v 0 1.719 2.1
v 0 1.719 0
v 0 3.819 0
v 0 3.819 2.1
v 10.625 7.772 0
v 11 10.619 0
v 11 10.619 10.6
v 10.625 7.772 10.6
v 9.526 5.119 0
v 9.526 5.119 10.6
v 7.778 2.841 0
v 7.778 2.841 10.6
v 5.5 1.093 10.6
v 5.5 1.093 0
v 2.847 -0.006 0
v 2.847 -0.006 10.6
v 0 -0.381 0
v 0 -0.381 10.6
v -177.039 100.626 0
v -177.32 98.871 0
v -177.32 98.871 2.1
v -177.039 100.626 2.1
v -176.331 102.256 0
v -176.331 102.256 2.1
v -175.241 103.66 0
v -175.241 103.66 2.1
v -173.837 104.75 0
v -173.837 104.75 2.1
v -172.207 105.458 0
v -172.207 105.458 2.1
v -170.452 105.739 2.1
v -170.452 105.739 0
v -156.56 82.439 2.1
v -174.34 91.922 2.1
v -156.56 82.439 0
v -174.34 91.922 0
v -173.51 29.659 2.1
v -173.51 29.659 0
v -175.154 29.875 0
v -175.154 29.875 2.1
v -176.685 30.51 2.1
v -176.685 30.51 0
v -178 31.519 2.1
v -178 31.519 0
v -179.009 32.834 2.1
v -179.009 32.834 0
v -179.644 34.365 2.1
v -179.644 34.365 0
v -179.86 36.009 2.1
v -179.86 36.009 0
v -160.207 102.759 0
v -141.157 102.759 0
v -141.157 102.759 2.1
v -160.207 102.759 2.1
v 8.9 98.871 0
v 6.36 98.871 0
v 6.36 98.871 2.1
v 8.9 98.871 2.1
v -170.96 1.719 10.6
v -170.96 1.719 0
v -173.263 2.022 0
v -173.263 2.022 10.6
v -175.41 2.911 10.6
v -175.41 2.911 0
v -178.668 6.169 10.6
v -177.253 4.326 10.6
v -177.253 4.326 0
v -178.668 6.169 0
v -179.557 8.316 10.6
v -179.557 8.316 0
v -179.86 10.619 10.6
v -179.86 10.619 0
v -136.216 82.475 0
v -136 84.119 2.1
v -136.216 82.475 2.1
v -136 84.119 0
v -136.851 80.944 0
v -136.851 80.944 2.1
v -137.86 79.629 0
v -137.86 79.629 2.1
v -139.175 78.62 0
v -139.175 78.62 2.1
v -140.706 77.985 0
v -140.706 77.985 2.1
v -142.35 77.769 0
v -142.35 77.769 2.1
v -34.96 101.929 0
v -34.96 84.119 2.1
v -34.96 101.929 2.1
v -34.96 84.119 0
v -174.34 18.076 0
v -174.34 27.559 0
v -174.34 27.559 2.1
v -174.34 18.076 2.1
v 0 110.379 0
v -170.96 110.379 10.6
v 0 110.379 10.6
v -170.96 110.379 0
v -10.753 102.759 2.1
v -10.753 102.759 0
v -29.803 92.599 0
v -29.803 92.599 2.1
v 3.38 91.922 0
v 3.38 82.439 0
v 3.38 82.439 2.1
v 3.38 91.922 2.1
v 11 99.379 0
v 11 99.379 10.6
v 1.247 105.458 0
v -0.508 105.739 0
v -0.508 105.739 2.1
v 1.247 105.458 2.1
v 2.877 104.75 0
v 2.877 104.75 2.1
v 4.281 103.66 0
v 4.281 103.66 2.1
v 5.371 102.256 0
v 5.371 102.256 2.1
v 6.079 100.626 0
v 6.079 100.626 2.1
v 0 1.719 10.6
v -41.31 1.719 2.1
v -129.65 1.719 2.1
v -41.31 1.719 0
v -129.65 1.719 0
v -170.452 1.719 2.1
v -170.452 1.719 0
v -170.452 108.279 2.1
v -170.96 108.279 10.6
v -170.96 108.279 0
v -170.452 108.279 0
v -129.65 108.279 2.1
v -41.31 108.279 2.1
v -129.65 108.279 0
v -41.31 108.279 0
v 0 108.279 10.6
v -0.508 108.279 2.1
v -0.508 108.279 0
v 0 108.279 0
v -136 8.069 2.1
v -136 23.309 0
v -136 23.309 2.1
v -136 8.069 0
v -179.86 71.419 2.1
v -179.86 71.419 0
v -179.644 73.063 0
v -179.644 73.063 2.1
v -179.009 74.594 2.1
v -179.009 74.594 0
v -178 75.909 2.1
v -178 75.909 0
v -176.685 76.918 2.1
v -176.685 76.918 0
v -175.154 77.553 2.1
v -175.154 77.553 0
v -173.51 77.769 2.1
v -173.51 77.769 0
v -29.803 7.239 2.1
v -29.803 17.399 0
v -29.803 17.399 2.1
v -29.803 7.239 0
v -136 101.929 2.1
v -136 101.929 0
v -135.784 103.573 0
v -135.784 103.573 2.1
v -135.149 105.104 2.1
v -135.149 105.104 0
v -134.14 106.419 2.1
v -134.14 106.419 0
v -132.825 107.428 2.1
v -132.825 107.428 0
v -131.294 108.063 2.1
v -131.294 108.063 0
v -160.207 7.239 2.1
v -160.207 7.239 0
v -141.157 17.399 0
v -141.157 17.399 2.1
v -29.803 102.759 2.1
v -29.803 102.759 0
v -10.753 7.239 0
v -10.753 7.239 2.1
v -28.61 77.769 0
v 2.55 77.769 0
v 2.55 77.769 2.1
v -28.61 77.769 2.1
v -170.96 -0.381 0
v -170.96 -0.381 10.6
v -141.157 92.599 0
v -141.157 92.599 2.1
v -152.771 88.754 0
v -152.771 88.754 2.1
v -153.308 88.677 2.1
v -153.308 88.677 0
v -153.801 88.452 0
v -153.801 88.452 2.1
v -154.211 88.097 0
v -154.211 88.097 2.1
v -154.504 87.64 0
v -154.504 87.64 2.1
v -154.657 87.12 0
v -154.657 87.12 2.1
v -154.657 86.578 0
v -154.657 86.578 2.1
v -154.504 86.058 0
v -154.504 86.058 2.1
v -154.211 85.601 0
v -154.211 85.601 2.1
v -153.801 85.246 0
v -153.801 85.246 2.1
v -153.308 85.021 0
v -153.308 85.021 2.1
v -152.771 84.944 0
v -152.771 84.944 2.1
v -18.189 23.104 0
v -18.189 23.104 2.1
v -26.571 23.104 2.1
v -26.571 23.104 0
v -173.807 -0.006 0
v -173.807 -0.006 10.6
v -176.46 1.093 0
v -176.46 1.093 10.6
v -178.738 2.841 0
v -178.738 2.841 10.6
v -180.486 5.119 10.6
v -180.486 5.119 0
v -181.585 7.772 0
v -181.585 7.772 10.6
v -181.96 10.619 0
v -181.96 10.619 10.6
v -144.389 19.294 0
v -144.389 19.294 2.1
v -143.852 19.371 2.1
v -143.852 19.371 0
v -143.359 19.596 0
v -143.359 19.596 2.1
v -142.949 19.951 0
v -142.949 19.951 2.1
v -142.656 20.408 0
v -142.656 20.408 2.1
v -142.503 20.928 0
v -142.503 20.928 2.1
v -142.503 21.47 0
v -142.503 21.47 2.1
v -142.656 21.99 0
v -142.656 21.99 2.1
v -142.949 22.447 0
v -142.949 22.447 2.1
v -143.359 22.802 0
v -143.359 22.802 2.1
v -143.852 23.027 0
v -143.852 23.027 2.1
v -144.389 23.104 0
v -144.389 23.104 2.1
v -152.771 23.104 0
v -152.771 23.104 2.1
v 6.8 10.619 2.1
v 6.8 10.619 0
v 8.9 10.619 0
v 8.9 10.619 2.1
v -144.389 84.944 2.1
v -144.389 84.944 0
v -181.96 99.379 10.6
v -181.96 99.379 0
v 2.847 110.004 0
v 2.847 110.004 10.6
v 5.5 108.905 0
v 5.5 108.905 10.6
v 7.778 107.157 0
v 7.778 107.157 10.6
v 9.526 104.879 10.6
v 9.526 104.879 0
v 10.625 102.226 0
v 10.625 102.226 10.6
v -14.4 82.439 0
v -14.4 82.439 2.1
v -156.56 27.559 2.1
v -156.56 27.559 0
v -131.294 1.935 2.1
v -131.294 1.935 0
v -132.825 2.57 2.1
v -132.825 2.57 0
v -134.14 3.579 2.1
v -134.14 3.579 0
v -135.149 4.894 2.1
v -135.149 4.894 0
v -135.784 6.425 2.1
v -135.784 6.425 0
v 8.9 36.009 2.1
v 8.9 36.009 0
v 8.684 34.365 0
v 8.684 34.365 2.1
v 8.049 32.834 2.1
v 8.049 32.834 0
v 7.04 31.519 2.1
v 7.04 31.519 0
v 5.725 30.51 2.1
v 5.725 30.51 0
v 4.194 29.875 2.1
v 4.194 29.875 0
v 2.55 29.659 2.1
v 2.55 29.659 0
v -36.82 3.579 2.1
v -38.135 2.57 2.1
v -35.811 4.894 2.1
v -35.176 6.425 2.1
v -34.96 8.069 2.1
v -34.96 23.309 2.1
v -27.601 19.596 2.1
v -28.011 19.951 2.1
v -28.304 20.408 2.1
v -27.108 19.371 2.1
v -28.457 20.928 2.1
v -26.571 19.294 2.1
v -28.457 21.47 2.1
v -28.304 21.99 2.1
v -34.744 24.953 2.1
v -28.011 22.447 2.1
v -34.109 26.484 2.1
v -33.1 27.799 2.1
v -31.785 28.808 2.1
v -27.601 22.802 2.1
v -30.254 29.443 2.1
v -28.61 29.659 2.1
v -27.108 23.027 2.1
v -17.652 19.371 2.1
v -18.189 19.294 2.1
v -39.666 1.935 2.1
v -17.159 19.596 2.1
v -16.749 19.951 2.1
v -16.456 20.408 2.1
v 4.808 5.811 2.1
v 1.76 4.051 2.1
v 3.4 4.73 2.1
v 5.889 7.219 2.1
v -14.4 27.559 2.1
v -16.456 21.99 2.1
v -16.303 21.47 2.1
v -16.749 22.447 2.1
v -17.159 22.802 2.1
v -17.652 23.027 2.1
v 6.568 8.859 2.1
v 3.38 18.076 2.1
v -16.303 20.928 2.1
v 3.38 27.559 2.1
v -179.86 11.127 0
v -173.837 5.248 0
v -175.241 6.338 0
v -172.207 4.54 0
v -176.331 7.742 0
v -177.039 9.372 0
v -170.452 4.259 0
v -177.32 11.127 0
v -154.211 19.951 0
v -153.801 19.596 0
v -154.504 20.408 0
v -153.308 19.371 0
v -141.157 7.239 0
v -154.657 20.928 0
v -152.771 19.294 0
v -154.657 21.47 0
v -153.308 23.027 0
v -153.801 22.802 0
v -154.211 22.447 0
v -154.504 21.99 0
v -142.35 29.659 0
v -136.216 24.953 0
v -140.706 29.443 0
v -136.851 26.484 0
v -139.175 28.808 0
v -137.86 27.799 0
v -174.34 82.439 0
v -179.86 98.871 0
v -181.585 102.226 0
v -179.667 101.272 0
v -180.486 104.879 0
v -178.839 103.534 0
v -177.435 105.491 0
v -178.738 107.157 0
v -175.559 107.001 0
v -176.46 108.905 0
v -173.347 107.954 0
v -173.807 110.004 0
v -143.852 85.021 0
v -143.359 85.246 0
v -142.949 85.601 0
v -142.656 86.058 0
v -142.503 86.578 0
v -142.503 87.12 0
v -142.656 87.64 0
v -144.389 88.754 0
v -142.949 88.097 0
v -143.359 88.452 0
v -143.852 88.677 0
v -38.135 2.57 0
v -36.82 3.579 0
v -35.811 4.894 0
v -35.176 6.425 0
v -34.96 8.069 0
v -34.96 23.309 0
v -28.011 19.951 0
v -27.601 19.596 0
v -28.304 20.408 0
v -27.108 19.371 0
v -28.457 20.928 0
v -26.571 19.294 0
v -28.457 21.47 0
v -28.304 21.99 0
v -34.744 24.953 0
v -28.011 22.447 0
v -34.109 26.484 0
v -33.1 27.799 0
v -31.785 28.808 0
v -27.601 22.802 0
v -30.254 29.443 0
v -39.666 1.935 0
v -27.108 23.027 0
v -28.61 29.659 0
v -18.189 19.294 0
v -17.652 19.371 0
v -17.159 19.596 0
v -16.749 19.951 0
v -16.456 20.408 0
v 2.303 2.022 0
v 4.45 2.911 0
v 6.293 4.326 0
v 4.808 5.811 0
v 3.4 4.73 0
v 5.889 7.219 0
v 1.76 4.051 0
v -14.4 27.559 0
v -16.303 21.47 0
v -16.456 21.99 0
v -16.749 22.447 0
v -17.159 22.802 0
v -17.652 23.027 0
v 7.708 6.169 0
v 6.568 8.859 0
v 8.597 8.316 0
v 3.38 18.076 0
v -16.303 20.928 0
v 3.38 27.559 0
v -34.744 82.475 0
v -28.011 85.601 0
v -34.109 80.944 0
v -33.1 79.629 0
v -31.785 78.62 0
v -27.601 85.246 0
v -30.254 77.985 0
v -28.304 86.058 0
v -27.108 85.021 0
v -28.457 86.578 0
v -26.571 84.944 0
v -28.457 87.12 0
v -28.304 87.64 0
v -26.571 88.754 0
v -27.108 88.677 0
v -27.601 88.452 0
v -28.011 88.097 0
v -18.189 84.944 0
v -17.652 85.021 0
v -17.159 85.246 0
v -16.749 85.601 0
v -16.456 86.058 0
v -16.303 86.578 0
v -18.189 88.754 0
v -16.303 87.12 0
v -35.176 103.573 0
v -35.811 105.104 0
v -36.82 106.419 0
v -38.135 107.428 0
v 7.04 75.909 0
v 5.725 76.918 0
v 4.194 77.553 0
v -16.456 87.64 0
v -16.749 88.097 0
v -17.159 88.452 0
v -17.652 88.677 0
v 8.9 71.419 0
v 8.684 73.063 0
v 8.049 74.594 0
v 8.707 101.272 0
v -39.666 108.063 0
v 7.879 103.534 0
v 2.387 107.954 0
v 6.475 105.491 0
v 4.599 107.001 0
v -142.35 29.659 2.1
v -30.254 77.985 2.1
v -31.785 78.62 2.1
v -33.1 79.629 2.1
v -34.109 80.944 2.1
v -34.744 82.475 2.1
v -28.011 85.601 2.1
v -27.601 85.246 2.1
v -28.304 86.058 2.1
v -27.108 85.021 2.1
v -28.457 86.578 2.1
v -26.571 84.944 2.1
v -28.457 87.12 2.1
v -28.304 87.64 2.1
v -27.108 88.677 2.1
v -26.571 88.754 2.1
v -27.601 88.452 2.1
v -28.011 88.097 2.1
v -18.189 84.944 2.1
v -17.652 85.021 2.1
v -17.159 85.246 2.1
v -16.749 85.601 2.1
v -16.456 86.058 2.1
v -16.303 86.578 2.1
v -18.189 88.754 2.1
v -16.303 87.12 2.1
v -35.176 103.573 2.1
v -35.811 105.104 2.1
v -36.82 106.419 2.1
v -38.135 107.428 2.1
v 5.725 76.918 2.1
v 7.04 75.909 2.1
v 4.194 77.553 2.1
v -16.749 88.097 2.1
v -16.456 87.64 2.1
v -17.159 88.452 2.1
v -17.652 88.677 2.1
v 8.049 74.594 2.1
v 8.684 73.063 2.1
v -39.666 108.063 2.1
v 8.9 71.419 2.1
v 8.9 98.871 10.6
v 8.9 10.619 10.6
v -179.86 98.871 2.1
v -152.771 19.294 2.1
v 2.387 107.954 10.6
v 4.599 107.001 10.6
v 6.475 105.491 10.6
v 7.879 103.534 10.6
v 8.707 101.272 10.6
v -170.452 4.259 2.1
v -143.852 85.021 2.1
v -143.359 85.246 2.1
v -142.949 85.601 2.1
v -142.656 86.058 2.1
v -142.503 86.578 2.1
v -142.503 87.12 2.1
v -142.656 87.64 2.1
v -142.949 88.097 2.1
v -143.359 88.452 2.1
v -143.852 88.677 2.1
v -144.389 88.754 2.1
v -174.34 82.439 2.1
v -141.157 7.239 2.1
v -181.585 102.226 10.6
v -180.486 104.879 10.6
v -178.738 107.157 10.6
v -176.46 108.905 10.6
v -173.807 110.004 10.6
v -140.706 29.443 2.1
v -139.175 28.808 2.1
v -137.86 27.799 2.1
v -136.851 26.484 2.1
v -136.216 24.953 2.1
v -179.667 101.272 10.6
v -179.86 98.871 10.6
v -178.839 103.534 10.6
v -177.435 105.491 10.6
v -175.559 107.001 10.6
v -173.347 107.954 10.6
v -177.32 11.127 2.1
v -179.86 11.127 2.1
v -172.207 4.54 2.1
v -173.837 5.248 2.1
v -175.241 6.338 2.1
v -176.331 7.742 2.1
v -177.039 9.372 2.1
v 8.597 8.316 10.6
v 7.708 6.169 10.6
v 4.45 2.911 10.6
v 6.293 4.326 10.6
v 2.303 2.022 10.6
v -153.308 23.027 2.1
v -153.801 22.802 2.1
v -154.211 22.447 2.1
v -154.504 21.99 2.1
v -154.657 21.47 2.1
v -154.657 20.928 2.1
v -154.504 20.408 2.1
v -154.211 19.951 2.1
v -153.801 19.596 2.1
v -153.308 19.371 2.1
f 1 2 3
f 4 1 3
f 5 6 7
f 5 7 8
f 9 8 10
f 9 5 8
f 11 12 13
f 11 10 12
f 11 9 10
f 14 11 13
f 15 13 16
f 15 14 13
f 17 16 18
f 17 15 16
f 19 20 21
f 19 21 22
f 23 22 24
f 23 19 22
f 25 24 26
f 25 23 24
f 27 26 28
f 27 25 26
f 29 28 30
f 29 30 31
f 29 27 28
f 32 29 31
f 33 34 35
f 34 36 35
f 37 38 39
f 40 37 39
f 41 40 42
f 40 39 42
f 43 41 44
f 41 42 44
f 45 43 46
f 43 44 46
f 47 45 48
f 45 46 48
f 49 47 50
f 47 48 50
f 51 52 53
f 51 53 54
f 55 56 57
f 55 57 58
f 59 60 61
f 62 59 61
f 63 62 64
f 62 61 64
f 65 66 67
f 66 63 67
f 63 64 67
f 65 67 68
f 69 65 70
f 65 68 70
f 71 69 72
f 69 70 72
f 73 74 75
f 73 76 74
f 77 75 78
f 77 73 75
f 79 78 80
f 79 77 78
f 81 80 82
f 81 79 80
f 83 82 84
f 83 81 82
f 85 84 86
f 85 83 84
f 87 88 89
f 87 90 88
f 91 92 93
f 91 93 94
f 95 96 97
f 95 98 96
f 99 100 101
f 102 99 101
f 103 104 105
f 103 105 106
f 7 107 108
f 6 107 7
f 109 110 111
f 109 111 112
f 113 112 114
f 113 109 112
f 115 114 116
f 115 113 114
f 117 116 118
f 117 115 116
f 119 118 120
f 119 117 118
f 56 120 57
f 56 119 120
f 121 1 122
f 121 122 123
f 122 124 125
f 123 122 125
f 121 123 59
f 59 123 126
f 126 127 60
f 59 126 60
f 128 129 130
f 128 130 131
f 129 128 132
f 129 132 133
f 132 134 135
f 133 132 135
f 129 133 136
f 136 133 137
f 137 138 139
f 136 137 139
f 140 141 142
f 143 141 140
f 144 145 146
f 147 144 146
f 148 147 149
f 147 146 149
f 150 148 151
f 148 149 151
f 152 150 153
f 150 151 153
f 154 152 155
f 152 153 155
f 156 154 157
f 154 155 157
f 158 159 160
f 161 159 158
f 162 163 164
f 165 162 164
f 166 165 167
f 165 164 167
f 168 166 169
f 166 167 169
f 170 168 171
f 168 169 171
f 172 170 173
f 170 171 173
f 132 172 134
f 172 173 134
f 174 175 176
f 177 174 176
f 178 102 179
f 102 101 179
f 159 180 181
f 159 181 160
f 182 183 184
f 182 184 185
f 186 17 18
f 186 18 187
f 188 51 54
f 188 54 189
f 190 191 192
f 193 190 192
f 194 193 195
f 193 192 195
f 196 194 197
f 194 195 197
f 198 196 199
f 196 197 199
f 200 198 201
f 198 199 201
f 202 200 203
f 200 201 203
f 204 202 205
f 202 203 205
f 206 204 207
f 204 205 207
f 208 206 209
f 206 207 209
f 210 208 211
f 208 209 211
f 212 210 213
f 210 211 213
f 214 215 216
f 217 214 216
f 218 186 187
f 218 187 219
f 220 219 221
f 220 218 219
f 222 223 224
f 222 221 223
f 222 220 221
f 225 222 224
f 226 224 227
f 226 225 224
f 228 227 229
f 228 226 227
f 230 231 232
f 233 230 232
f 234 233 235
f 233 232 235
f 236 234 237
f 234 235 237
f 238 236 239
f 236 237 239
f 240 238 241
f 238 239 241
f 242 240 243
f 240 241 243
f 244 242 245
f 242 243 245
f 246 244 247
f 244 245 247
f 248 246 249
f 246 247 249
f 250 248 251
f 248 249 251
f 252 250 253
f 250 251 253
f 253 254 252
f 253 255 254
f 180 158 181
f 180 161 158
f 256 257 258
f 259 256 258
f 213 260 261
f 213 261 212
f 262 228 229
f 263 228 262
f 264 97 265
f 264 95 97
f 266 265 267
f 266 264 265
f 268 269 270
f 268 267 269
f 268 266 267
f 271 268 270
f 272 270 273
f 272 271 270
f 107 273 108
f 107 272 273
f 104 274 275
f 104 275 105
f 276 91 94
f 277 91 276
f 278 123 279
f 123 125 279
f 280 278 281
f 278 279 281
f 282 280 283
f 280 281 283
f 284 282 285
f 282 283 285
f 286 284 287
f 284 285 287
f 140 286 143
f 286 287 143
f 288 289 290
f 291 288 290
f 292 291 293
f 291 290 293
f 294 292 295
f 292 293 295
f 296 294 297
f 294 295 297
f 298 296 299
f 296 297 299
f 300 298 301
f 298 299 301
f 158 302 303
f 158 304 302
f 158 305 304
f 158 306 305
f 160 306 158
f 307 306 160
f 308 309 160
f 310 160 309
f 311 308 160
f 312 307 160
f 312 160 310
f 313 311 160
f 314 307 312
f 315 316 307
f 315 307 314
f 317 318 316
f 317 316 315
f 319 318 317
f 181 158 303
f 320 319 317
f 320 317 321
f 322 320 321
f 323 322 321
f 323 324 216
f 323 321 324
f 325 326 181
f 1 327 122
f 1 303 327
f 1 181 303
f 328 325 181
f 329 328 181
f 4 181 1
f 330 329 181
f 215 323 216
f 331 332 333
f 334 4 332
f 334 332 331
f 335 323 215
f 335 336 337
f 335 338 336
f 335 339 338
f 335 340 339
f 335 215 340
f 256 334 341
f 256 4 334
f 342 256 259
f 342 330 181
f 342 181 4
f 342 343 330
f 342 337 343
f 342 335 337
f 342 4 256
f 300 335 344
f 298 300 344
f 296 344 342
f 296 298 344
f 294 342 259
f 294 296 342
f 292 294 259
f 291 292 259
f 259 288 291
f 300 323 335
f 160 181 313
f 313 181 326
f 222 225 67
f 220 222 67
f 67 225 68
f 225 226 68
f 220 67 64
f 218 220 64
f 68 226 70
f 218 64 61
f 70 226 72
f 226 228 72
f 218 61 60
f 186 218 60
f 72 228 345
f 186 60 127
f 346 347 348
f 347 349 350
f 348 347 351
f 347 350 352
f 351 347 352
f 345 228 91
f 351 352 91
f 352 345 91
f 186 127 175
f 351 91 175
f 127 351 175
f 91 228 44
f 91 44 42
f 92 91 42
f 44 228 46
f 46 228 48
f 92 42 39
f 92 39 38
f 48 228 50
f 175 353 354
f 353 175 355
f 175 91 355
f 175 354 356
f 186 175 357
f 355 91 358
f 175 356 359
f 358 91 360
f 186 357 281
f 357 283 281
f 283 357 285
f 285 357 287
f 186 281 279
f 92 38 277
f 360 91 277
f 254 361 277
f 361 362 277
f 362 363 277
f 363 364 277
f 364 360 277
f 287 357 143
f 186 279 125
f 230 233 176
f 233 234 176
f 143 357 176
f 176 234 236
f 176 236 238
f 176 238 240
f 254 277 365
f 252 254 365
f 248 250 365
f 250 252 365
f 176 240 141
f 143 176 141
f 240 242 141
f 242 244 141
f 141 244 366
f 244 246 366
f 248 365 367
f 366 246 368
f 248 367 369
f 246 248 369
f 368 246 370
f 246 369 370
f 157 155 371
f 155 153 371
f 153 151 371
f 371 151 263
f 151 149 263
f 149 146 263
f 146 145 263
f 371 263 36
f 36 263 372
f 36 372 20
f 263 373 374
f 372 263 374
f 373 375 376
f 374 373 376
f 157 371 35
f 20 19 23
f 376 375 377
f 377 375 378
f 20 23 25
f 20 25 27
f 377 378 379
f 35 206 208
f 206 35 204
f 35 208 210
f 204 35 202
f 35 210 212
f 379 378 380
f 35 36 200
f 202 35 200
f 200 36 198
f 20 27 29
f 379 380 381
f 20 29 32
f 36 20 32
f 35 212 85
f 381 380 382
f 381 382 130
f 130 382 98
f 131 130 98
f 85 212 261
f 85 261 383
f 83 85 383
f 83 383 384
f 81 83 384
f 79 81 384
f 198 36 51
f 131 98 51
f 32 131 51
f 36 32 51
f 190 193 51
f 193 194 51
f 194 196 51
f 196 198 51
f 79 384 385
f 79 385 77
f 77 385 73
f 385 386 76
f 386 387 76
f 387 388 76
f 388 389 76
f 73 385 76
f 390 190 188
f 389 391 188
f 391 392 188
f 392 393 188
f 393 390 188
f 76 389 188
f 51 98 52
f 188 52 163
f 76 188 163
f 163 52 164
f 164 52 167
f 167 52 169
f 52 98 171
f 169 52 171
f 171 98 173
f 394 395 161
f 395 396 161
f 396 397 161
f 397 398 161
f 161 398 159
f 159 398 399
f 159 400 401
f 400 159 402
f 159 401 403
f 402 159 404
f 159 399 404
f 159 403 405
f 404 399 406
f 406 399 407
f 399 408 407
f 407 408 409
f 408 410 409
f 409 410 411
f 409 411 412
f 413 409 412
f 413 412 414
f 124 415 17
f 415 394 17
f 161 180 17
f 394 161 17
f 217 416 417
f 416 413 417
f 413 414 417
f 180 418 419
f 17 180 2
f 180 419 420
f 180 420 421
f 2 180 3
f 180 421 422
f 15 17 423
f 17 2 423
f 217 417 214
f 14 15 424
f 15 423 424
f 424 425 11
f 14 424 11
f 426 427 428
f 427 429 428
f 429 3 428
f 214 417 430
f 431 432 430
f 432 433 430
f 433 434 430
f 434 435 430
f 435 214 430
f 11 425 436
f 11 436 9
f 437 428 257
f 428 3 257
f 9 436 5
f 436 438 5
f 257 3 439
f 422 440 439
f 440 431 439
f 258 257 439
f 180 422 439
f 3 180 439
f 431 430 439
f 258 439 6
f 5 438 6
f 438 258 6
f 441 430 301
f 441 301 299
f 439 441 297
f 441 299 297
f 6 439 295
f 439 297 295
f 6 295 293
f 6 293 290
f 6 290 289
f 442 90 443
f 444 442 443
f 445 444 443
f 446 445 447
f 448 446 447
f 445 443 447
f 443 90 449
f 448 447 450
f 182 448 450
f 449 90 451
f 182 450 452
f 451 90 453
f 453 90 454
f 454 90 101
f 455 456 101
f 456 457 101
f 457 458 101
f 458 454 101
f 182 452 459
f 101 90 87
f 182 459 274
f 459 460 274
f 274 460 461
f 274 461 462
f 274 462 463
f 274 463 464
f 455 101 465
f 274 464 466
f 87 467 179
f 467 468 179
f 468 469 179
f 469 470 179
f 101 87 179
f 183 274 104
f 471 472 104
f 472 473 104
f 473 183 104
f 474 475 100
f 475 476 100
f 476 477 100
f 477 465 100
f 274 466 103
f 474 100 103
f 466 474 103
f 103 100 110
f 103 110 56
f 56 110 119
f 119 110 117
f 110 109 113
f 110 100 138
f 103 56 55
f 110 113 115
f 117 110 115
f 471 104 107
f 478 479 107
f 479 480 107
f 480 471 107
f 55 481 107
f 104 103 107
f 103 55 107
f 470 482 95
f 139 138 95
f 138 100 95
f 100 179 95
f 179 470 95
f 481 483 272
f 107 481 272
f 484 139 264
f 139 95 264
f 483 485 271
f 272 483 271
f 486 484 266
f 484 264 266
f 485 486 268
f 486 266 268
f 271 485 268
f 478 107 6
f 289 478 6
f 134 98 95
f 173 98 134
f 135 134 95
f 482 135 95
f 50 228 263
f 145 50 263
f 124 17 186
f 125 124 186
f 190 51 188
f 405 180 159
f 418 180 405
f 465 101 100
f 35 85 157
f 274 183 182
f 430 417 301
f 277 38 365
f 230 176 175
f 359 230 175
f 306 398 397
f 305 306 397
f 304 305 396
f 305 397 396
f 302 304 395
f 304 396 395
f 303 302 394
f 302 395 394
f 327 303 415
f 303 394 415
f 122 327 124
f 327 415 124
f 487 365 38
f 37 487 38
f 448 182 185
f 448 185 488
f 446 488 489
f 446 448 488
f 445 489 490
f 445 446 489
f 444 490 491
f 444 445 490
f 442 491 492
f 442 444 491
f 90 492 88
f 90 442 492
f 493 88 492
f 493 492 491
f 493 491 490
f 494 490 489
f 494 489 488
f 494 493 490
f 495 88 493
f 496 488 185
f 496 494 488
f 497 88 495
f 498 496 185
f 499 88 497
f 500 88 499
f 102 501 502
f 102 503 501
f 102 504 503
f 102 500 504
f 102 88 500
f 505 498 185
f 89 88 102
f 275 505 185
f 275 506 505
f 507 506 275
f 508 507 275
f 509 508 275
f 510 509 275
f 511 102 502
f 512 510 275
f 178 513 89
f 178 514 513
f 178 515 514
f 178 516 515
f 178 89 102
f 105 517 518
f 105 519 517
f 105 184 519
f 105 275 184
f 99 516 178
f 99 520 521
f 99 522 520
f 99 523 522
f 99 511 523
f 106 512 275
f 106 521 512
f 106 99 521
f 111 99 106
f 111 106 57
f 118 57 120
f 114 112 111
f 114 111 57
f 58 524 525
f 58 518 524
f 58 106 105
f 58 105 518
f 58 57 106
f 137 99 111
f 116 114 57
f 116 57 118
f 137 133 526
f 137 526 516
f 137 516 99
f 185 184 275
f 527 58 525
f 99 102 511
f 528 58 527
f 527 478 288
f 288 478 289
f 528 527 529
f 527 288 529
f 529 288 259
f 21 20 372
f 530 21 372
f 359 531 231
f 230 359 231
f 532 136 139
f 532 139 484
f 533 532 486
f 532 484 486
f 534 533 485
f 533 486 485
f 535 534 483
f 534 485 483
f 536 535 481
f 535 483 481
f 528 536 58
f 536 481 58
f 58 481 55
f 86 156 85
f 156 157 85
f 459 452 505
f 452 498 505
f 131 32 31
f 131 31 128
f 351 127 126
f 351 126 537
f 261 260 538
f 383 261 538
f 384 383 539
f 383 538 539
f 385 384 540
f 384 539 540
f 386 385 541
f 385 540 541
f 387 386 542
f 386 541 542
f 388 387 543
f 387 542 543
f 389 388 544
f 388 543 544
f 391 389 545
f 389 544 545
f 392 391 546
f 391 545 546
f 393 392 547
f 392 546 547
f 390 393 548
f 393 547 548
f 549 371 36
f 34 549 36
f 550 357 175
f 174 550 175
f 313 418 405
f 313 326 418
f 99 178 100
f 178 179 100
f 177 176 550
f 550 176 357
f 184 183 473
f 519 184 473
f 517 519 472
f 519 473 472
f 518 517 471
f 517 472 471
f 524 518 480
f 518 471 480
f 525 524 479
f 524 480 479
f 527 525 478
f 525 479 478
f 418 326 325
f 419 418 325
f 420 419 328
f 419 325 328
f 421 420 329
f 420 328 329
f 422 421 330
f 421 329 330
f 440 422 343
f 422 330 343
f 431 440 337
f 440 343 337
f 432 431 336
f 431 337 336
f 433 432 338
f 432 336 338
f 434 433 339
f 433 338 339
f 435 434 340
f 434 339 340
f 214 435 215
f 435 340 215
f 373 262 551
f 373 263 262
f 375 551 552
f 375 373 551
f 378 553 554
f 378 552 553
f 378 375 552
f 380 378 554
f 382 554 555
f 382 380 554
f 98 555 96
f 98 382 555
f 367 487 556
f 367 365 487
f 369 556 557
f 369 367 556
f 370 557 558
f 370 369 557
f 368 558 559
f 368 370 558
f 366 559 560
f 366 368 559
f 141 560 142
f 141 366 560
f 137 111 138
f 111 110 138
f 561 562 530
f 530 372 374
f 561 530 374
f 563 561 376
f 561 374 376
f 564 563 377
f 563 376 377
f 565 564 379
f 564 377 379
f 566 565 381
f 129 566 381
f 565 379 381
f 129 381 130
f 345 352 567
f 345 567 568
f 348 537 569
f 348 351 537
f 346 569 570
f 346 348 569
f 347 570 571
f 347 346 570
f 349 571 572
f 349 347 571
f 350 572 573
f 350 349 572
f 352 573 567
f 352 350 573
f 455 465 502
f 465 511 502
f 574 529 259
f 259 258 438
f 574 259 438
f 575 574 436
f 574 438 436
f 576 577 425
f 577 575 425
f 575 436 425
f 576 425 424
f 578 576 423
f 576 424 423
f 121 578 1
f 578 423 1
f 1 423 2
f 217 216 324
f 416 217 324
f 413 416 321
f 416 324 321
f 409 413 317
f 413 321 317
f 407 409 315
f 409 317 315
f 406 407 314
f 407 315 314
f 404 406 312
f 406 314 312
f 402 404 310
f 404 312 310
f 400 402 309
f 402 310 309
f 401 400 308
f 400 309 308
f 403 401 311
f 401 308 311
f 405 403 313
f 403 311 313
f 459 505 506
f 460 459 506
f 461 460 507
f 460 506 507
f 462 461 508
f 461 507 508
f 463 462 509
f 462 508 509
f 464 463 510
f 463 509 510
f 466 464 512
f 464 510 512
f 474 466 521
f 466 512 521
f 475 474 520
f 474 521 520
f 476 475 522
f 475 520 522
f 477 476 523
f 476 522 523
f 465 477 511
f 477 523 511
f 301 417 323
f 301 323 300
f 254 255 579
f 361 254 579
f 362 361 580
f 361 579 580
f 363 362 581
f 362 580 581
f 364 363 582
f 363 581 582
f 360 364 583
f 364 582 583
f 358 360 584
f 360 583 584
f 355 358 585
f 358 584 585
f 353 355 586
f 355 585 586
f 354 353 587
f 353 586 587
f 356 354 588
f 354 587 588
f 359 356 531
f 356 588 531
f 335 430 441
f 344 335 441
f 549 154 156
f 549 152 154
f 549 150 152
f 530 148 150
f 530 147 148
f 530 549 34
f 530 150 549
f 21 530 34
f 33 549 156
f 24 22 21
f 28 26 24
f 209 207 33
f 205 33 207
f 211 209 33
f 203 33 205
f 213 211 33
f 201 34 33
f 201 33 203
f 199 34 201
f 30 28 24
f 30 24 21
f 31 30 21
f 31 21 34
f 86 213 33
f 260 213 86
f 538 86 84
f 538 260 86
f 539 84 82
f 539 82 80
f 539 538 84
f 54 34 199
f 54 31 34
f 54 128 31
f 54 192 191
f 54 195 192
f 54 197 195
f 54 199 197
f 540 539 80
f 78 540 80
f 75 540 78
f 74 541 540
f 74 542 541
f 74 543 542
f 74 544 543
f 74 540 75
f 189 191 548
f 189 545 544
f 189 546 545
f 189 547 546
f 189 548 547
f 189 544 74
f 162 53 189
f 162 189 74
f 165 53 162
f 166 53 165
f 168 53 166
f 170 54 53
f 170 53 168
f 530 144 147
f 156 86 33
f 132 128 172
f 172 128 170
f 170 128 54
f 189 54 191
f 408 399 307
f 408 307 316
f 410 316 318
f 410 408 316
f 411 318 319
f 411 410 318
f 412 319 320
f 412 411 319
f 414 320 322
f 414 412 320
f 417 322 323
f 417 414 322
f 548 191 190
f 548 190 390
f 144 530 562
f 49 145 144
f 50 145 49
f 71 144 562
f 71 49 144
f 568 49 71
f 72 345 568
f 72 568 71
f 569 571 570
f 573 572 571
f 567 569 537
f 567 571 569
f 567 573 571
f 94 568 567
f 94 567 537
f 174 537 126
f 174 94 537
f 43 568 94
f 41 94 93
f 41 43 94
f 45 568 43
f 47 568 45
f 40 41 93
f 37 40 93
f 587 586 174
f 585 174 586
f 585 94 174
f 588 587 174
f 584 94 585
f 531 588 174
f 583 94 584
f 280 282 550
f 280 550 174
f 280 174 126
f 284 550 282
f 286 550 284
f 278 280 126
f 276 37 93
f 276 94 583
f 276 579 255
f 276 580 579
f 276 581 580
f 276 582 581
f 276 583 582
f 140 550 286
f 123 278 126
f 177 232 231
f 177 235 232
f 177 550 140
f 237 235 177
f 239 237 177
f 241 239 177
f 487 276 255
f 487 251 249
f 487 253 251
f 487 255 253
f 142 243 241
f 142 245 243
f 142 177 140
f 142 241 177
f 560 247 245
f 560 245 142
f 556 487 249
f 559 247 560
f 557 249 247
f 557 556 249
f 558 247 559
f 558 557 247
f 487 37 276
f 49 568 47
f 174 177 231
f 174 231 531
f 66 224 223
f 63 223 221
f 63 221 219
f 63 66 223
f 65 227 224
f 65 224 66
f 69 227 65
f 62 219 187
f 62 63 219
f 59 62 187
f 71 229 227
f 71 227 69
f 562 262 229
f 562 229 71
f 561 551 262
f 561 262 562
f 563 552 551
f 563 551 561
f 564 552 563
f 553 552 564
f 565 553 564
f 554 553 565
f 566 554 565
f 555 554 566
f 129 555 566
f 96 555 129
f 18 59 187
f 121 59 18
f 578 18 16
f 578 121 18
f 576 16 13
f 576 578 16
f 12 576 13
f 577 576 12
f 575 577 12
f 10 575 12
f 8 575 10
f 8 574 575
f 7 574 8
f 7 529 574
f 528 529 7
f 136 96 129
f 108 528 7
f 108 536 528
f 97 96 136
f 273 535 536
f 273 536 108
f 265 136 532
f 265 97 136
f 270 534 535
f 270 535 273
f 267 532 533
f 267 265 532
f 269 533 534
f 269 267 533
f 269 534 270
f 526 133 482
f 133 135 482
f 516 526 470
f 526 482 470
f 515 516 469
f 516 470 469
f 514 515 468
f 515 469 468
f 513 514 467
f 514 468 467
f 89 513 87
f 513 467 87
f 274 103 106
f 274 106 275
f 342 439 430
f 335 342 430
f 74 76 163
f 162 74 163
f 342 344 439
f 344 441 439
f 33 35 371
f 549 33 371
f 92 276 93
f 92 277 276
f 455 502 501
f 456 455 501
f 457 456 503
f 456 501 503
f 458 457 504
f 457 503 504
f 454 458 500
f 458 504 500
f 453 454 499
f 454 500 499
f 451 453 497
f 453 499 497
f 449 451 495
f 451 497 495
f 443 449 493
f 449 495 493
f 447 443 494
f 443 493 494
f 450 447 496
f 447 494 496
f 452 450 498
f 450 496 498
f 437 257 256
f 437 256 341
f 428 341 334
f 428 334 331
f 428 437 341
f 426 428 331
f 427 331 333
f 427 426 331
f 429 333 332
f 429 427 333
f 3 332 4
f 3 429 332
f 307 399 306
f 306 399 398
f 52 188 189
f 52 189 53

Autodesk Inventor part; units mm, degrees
ref_plane "YZ Plane" through (0, 0, 0) normal (1, 0, 0) x (0, 1, 0)
ref_plane "XZ Plane" through (0, 0, 0) normal (0, 1, 0) x (-1, 0, 0)
ref_plane "XY Plane" through (0, 0, 0) normal (0, 0, 1) x (1, 0, 0)
sketch "Sketch1" plane through (0, 0, 0) normal (0, 0, 1) x (1, 0, 0)
  arc A0 (0, -0.381) -> (11, 10.619) centre (0, 10.619) ccw projected
  line L0 (11, 99.379) -> (11, 10.619) projected
  line L1 (0, -0.381) -> (-170.96, -0.381) projected
  arc A1 (11, 99.379) -> (0, 110.379) centre (0, 99.379) ccw projected
  line L2 (-170.96, 110.379) -> (0, 110.379) projected
  arc A2 (-170.96, 110.379) -> (-181.96, 99.379) centre (-170.96, 99.379) ccw projected
  line L3 (-181.96, 10.619) -> (-181.96, 99.379) projected
  arc A3 (-181.96, 10.619) -> (-170.96, -0.381) centre (-170.96, 10.619) ccw projected
  circle A4 centre (-22.38, 21.199) radius 1.5 projected
  circle A5 centre (-148.58, 21.199) radius 1.5 projected
  circle A6 centre (-148.58, 86.849) radius 1.5 projected
  circle A7 centre (-22.38, 86.849) radius 1.5 projected
  circle A8 centre (-22.38, 21.199) radius 1.905
  circle A9 centre (-22.38, 86.849) radius 1.905
  line L4 (-41.31, 1.719) -> (-129.65, 1.719)
  line L5 (-129.65, 108.279) -> (-41.31, 108.279)
  line L6 (8.9, 71.419) -> (8.9, 36.009)
  line L7 (-34.96, 23.309) -> (-34.96, 8.069)
  line L8 (-28.61, 29.659) -> (2.55, 29.659)
  arc A10 (-28.61, 29.659) -> (-34.96, 23.309) centre (-28.61, 23.309) ccw
  line L9 (2.55, 77.769) -> (-28.61, 77.769)
  line L10 (-34.96, 84.119) -> (-34.96, 101.929)
  arc A11 (-34.96, 84.119) -> (-28.61, 77.769) centre (-28.61, 84.119) ccw
  arc A12 (2.55, 29.659) -> (8.9, 36.009) centre (2.55, 36.009) ccw
  arc A13 (-41.31, 1.719) -> (-34.96, 8.069) centre (-41.31, 8.069) ccw
  arc A14 (-34.96, 101.929) -> (-41.31, 108.279) centre (-41.31, 101.929) ccw
  arc A15 (8.9, 71.419) -> (2.55, 77.769) centre (2.55, 71.419) ccw
  line L11 (-29.88, 25.199) -> (-29.88, 17.199) projected
  line L12 (-14.88, 25.199) -> (-29.88, 25.199) projected
  line L13 (-29.88, 82.849) -> (-14.88, 82.849) projected
  line L14 (-29.88, 90.849) -> (-29.88, 82.849) projected
  circle A16 centre (-148.58, 21.199) radius 1.905
  circle A17 centre (-148.58, 86.849) radius 1.905
  line L15 (-179.86, 71.419) -> (-179.86, 36.009)
  line L16 (-136, 23.309) -> (-136, 8.069)
  line L17 (-142.35, 29.659) -> (-173.51, 29.659)
  arc A18 (-136, 23.309) -> (-142.35, 29.659) centre (-142.35, 23.309) ccw
  line L18 (-173.51, 77.769) -> (-142.35, 77.769)
  line L19 (-136, 84.119) -> (-136, 101.929)
  arc A19 (-142.35, 77.769) -> (-136, 84.119) centre (-142.35, 84.119) ccw
  arc A20 (-179.86, 36.009) -> (-173.51, 29.659) centre (-173.51, 36.009) ccw
  arc A21 (-136, 8.069) -> (-129.65, 1.719) centre (-129.65, 8.069) ccw
  arc A22 (-129.65, 108.279) -> (-136, 101.929) centre (-129.65, 101.929) ccw
  arc A23 (-173.51, 77.769) -> (-179.86, 71.419) centre (-173.51, 71.419) ccw
  point P0 (0, 0)
  point P1 (-34.96, 1.719)
  point P2 (8.9, 29.659)
  point P3 (8.9, 77.769)
  point P4 (-34.96, 77.769)
  point P5 (-34.96, 108.279)
  dimension "d1" = 23.53
  dimension "d2" = 3.81
  dimension "d5" = 3.81
  dimension "d16" = 27.94
  dimension "d18" = 6.35
  dimension "d21" = 6.35
  dimension "d22" = 6.35
  dimension "d23" = 2.1
  dimension "d24" = 2.1
  dimension "d25" = 2.1
  dimension "d33" = 5.08
  dimension "d34" = 5.08
  dimension "d35" = 5.08
  dimension "d36" = 6.35
  dimension "d37" = 6.35
extrude "Extrusion3" add sketch "Sketch1" along normal blind 2.1 contours L1 A3 L3 A2 L2 A1 L0 A0
sketch "Sketch4" plane through (0, 0, 2.1) normal (0, 0, 1) x (1, 0, 0)
  arc A0 (-28.61, 29.659) -> (-34.96, 23.309) centre (-28.61, 23.309) ccw projected
  line L0 (-34.96, 23.309) -> (-34.96, 8.069) projected
  arc A1 (-41.31, 1.719) -> (-34.96, 8.069) centre (-41.31, 8.069) ccw projected
  line L1 (-41.31, 1.719) -> (-129.65, 1.719) projected
  arc A2 (-136, 8.069) -> (-129.65, 1.719) centre (-129.65, 8.069) ccw projected
  line L2 (-136, 8.069) -> (-136, 23.309) projected
  arc A3 (-136, 23.309) -> (-142.35, 29.659) centre (-142.35, 23.309) ccw projected
  line L3 (-142.35, 29.659) -> (-173.51, 29.659) projected
  arc A4 (-179.86, 36.009) -> (-173.51, 29.659) centre (-173.51, 36.009) ccw projected
  line L4 (-179.86, 36.009) -> (-179.86, 71.419) projected
  arc A5 (-173.51, 77.769) -> (-179.86, 71.419) centre (-173.51, 71.419) ccw projected
  line L5 (-173.51, 77.769) -> (-142.35, 77.769) projected
  arc A6 (-142.35, 77.769) -> (-136, 84.119) centre (-142.35, 84.119) ccw projected
  line L6 (-136, 84.119) -> (-136, 101.929) projected
  arc A7 (-129.65, 108.279) -> (-136, 101.929) centre (-129.65, 101.929) ccw projected
  line L7 (-129.65, 108.279) -> (-41.31, 108.279) projected
  arc A8 (-34.96, 101.929) -> (-41.31, 108.279) centre (-41.31, 101.929) ccw projected
  line L8 (-34.96, 101.929) -> (-34.96, 84.119) projected
  arc A9 (-34.96, 84.119) -> (-28.61, 77.769) centre (-28.61, 84.119) ccw projected
  line L9 (-28.61, 77.769) -> (2.55, 77.769) projected
  arc A10 (8.9, 71.419) -> (2.55, 77.769) centre (2.55, 71.419) ccw projected
  line L10 (8.9, 71.419) -> (8.9, 36.009) projected
  arc A11 (2.55, 29.659) -> (8.9, 36.009) centre (2.55, 36.009) ccw projected
  line L11 (2.55, 29.659) -> (-28.61, 29.659) projected
  circle A12 centre (-148.58, 86.849) radius 1.905 projected
  circle A13 centre (-148.58, 21.199) radius 1.905 projected
  circle A14 centre (-22.38, 86.849) radius 1.905 projected
  circle A15 centre (-22.38, 21.199) radius 1.905 projected
  arc A16 (0, -0.381) -> (11, 10.619) centre (0, 10.619) ccw projected
  line L12 (11, 10.619) -> (11, 99.379) projected
  arc A17 (11, 99.379) -> (0, 110.379) centre (0, 99.379) ccw projected
  line L13 (0, 110.379) -> (-170.96, 110.379) projected
  arc A18 (-170.96, 110.379) -> (-181.96, 99.379) centre (-170.96, 99.379) ccw projected
  line L14 (-181.96, 99.379) -> (-181.96, 10.619) projected
  arc A19 (-181.96, 10.619) -> (-170.96, -0.381) centre (-170.96, 10.619) ccw projected
  line L15 (-170.96, -0.381) -> (0, -0.381) projected
  arc A20 (0, 1.719) -> (8.9, 10.619) centre (0, 10.619) ccw
  line L16 (8.9, 10.619) -> (8.9, 99.379)
  arc A21 (8.9, 99.379) -> (0, 108.279) centre (0, 99.379) ccw
  line L17 (0, 108.279) -> (-170.96, 108.279)
  arc A22 (-170.96, 108.279) -> (-179.86, 99.379) centre (-170.96, 99.379) ccw
  line L18 (-179.86, 99.379) -> (-179.86, 10.619)
  arc A23 (-179.86, 10.619) -> (-170.96, 1.719) centre (-170.96, 10.619) ccw
  line L19 (-170.96, 1.719) -> (0, 1.719)
  point P0 (0, 0)
  dimension "d40" = 2.1
extrude "Extrusion4" add sketch "Sketch4" along normal blind 8.5 contours L15 A19 L14 A18 L13 A17 L12 A16
ref_plane "Work Plane1" through (-85.48, 10.619, 10.6) normal (-1, 0, 0) x (0, 0, 1)
ref_plane "Work Plane2" through (-170.96, 54.999, 10.6) normal (0, -1, 0) x (1, 0, 0)
sketch "Sketch9" plane through (0, 0, 0) normal (0, 0, -1) x (-1, 0, 0)
  arc A0 (-8.9, 10.619) -> (0, 1.719) centre (0, 10.619) ccw projected
  arc A1 (-6.8, 10.619) -> (0, 3.819) centre (0, 10.619) ccw projected
  line L0 (0, 1.719) -> (0, 3.819) projected
  line L1 (-6.8, 10.619) -> (-8.9, 10.619) projected
  arc A2 (170.96, 1.719) -> (179.86, 10.619) centre (170.96, 10.619) ccw projected
  arc A3 (170.96, 3.819) -> (177.76, 10.619) centre (170.96, 10.619) ccw projected
  line L2 (170.96, 3.819) -> (170.96, 1.719) projected
  line L3 (179.86, 10.619) -> (177.76, 10.619) projected
  arc A4 (179.86, 99.379) -> (170.96, 108.279) centre (170.96, 99.379) ccw projected
  arc A5 (177.76, 99.379) -> (170.96, 106.179) centre (170.96, 99.379) ccw projected
  line L4 (177.76, 99.379) -> (179.86, 99.379) projected
  line L5 (170.96, 108.279) -> (170.96, 106.179) projected
  arc A6 (0, 106.179) -> (-6.8, 99.379) centre (0, 99.379) ccw projected
  arc A7 (0, 108.279) -> (-8.9, 99.379) centre (0, 99.379) ccw projected
  line L6 (-8.9, 99.379) -> (-6.8, 99.379) projected
  line L7 (0, 106.179) -> (0, 108.279) projected
  line L8 (170.96, 1.719) -> (0, 1.719) projected
  line L9 (0.508, 1.719) -> (0, 1.719)
  line L10 (-6.36, 11.127) -> (-8.9, 11.127)
  line L11 (-8.9, 11.127) -> (-8.9, 10.619)
  line L12 (0.508, 1.719) -> (0.508, 4.259)
  arc A8 (-6.36, 11.127) -> (0.508, 4.259) centre (0.748, 11.367) ccw
  arc A9 (-8.9, 10.619) -> (0, 1.719) centre (0, 10.619) ccw
  line L13 (-6.36, 98.871) -> (-8.9, 98.871)
  line L14 (-8.9, 99.379) -> (-8.9, 10.619) projected
  line L15 (0.508, 105.739) -> (0.508, 108.279)
  line L16 (0.508, 108.279) -> (0, 108.279)
  arc A10 (0, 108.279) -> (-8.9, 98.871) centre (0, 99.3653) ccw
  arc A11 (0.508, 105.739) -> (-6.36, 98.871) centre (0.748, 98.631) ccw
  line L17 (0, -0.381) -> (170.96, -0.381) projected
  line L18 (85.48, -0.381) -> (85.48, 110.379)
  line L19 (170.96, 110.379) -> (0, 110.379) projected
  arc A12 (170.96, 1.719) -> (179.86, 10.619) centre (170.96, 10.619) ccw
  line L20 (170.452, 1.719) -> (170.96, 1.719)
  line L21 (177.32, 11.127) -> (179.86, 11.127)
  line L22 (170.452, 1.719) -> (170.452, 4.259)
  arc A13 (170.452, 4.259) -> (177.32, 11.127) centre (170.212, 11.367) ccw
  line L23 (177.32, 98.871) -> (179.86, 98.871)
  line L24 (179.86, 99.379) -> (179.86, 10.619)
  line L25 (170.452, 105.739) -> (170.452, 108.279)
  line L26 (170.452, 108.279) -> (170.96, 108.279)
  arc A14 (179.86, 98.871) -> (170.96, 108.279) centre (170.96, 99.3653) ccw
  arc A15 (177.32, 98.871) -> (170.452, 105.739) centre (170.212, 98.631) ccw
  point P0 (0, 0)
  point P1 (17.526, 1.719)
  dimension "d73" = 0.508
  dimension "d74" = 0.508
  dimension "d75" = 2.54
  dimension "d76" = 2.54
  dimension "d77" = 7.112
  dimension "d78" = 2.54
  dimension "d79" = 2.54
  dimension "d80" = 0.508
  dimension "d81" = 0.508
  dimension "d82" = 7.112
extrude "Extrusion7" cut sketch "Sketch9" against normal up to next contours L1 A1 L0 A0 | L7 A6 L6 A7 | A10 L16 L15 A11 L13 | L23 A15 L25 L26 L5 A5 L4 L24 | L24 A4 A14 | L22 A13 L21 L24 L3 A3 L2 L8 | L2 A3 L3 A2 | L4 A5 L5 A4
sketch "Sketch10" plane through (0, 0, 0) normal (0, 0, -1) x (-1, 0, 0)
  line L0 (-3.38, 18.0763) -> (14.4, 27.559)
  line L1 (14.4, 27.559) -> (-3.38, 27.559)
  line L2 (-3.38, 27.559) -> (-3.38, 18.0763)
  line L3 (10.7529, 7.239) -> (29.8029, 17.399)
  line L4 (29.8029, 17.399) -> (29.8029, 7.239)
  line L5 (29.8029, 7.239) -> (10.7529, 7.239)
  line L6 (0, -0.381) -> (170.96, -0.381) projected
  line L7 (-11, 99.379) -> (-11, 10.619) projected
  line L8 (181.96, 99.379) -> (181.96, 10.619) projected
  line L9 (181.96, 54.999) -> (-11, 54.999)
  line L10 (-11, 10.619) -> (-11, 99.379) projected
  line L11 (85.48, -0.381) -> (85.48, 110.379)
  line L12 (0, 110.379) -> (170.96, 110.379) projected
  line L13 (174.34, 18.0763) -> (156.56, 27.559)
  line L14 (156.56, 27.559) -> (174.34, 27.559)
  line L15 (174.34, 27.559) -> (174.34, 18.0763)
  line L16 (160.2071, 7.239) -> (141.1571, 17.399)
  line L17 (141.1571, 17.399) -> (141.1571, 7.239)
  line L18 (141.1571, 7.239) -> (160.2071, 7.239)
  line L19 (-3.38, 91.9217) -> (14.4, 82.439)
  line L20 (14.4, 82.439) -> (-3.38, 82.439)
  line L21 (-3.38, 82.439) -> (-3.38, 91.9217)
  line L22 (10.7529, 102.759) -> (29.8029, 92.599)
  line L23 (29.8029, 92.599) -> (29.8029, 102.759)
  line L24 (29.8029, 102.759) -> (10.7529, 102.759)
  line L25 (141.1571, 102.759) -> (160.2071, 102.759)
  line L26 (141.1571, 92.599) -> (141.1571, 102.759)
  line L27 (160.2071, 102.759) -> (141.1571, 92.599)
  line L28 (174.34, 91.9217) -> (156.56, 82.439)
  line L29 (156.56, 82.439) -> (174.34, 82.439)
  line L30 (174.34, 82.439) -> (174.34, 91.9217)
  point P0 (0, 0)
  point P1 (-11, 19.255)
  dimension "d85" = 17.78
  dimension "d86" = 19.05
  dimension "d87" = 10.16
  dimension "d88" = 7.62
  dimension "d89" = 7.62
  dimension "d102" = 27.94
extrude "Extrusion8" cut sketch "Sketch10" against normal up to next
sketch "Sketch11" plane through (0, 0, 2.1) normal (0, 0, 1) x (1, 0, 0)
  arc A0 (-144.389, 84.944) -> (-144.389, 88.754) centre (-144.389, 86.849) ccw
  circle A1 centre (-148.58, 86.849) radius 1.905 projected
  arc A2 (-152.771, 88.754) -> (-152.771, 84.944) centre (-152.771, 86.849) ccw
  line L0 (-152.771, 88.754) -> (-144.389, 88.754)
  line L1 (-144.389, 84.944) -> (-152.771, 84.944)
  circle A3 centre (-148.58, 21.199) radius 1.905 projected
  arc A4 (-144.389, 19.294) -> (-144.389, 23.104) centre (-144.389, 21.199) ccw
  arc A5 (-152.771, 23.104) -> (-152.771, 19.294) centre (-152.771, 21.199) ccw
  line L2 (-152.771, 23.104) -> (-144.389, 23.104)
  line L3 (-152.771, 19.294) -> (-144.389, 19.294)
  line L4 (-85.48, -22.533) -> (-85.48, 132.531) projected
  arc A6 (-26.571, 88.754) -> (-26.571, 84.944) centre (-26.571, 86.849) ccw
  arc A7 (-18.189, 84.944) -> (-18.189, 88.754) centre (-18.189, 86.849) ccw
  line L5 (-18.189, 88.754) -> (-26.571, 88.754)
  line L6 (-26.571, 84.944) -> (-18.189, 84.944)
  arc A8 (-26.571, 23.104) -> (-26.571, 19.294) centre (-26.571, 21.199) ccw
  arc A9 (-18.189, 19.294) -> (-18.189, 23.104) centre (-18.189, 21.199) ccw
  line L7 (-18.189, 23.104) -> (-26.571, 23.104)
  line L8 (-18.189, 19.294) -> (-26.571, 19.294)
  point P0 (0, 0)
  point P1 (-148.58, 88.754)
  point P2 (-148.58, 23.104)
  dimension "d92" = 3.81
  dimension "d93" = 1.905
  dimension "d94" = 1.905
  dimension "d96" = 8.382
  dimension "d97" = 1.905
  dimension "d98" = 1.905
  dimension "d101" = 8.382
extrude "Extrusion9" cut sketch "Sketch11" against normal up to next contours L1 A1 L0 A0 | L1 A2 L0 A1 | A3 L2 A4 L3 | A3 L3 A5 L2 | L5 A7 L6 A6 | L7 A9 L8 A8
equation "\"d24\" = d23"
equation "\"d25\" = d23"
equation "\"d36\" = d22"
equation "\"d37\" = d22"
equation "\"d74\" = d73"
equation "\"d76\" = d75"
equation "\"d78\" = d75"
equation "\"d79\" = d78"
equation "\"d80\" = d74"
equation "\"d81\" = d80"
equation "\"d82\" = d77"
equation "\"d93\" = 0.5 * d92"
equation "\"d94\" = 0.5 * d95"
equation "\"d97\" = d93"
equation "\"d98\" = d99"
equation "\"d101\" = d96"
equation "\"d99\" = 0.5 * d100"
equation "\"d95\" = 3.81"
equation "\"d100\" = 3.81"
properties part number "Hub Enclosure Front (new)"
